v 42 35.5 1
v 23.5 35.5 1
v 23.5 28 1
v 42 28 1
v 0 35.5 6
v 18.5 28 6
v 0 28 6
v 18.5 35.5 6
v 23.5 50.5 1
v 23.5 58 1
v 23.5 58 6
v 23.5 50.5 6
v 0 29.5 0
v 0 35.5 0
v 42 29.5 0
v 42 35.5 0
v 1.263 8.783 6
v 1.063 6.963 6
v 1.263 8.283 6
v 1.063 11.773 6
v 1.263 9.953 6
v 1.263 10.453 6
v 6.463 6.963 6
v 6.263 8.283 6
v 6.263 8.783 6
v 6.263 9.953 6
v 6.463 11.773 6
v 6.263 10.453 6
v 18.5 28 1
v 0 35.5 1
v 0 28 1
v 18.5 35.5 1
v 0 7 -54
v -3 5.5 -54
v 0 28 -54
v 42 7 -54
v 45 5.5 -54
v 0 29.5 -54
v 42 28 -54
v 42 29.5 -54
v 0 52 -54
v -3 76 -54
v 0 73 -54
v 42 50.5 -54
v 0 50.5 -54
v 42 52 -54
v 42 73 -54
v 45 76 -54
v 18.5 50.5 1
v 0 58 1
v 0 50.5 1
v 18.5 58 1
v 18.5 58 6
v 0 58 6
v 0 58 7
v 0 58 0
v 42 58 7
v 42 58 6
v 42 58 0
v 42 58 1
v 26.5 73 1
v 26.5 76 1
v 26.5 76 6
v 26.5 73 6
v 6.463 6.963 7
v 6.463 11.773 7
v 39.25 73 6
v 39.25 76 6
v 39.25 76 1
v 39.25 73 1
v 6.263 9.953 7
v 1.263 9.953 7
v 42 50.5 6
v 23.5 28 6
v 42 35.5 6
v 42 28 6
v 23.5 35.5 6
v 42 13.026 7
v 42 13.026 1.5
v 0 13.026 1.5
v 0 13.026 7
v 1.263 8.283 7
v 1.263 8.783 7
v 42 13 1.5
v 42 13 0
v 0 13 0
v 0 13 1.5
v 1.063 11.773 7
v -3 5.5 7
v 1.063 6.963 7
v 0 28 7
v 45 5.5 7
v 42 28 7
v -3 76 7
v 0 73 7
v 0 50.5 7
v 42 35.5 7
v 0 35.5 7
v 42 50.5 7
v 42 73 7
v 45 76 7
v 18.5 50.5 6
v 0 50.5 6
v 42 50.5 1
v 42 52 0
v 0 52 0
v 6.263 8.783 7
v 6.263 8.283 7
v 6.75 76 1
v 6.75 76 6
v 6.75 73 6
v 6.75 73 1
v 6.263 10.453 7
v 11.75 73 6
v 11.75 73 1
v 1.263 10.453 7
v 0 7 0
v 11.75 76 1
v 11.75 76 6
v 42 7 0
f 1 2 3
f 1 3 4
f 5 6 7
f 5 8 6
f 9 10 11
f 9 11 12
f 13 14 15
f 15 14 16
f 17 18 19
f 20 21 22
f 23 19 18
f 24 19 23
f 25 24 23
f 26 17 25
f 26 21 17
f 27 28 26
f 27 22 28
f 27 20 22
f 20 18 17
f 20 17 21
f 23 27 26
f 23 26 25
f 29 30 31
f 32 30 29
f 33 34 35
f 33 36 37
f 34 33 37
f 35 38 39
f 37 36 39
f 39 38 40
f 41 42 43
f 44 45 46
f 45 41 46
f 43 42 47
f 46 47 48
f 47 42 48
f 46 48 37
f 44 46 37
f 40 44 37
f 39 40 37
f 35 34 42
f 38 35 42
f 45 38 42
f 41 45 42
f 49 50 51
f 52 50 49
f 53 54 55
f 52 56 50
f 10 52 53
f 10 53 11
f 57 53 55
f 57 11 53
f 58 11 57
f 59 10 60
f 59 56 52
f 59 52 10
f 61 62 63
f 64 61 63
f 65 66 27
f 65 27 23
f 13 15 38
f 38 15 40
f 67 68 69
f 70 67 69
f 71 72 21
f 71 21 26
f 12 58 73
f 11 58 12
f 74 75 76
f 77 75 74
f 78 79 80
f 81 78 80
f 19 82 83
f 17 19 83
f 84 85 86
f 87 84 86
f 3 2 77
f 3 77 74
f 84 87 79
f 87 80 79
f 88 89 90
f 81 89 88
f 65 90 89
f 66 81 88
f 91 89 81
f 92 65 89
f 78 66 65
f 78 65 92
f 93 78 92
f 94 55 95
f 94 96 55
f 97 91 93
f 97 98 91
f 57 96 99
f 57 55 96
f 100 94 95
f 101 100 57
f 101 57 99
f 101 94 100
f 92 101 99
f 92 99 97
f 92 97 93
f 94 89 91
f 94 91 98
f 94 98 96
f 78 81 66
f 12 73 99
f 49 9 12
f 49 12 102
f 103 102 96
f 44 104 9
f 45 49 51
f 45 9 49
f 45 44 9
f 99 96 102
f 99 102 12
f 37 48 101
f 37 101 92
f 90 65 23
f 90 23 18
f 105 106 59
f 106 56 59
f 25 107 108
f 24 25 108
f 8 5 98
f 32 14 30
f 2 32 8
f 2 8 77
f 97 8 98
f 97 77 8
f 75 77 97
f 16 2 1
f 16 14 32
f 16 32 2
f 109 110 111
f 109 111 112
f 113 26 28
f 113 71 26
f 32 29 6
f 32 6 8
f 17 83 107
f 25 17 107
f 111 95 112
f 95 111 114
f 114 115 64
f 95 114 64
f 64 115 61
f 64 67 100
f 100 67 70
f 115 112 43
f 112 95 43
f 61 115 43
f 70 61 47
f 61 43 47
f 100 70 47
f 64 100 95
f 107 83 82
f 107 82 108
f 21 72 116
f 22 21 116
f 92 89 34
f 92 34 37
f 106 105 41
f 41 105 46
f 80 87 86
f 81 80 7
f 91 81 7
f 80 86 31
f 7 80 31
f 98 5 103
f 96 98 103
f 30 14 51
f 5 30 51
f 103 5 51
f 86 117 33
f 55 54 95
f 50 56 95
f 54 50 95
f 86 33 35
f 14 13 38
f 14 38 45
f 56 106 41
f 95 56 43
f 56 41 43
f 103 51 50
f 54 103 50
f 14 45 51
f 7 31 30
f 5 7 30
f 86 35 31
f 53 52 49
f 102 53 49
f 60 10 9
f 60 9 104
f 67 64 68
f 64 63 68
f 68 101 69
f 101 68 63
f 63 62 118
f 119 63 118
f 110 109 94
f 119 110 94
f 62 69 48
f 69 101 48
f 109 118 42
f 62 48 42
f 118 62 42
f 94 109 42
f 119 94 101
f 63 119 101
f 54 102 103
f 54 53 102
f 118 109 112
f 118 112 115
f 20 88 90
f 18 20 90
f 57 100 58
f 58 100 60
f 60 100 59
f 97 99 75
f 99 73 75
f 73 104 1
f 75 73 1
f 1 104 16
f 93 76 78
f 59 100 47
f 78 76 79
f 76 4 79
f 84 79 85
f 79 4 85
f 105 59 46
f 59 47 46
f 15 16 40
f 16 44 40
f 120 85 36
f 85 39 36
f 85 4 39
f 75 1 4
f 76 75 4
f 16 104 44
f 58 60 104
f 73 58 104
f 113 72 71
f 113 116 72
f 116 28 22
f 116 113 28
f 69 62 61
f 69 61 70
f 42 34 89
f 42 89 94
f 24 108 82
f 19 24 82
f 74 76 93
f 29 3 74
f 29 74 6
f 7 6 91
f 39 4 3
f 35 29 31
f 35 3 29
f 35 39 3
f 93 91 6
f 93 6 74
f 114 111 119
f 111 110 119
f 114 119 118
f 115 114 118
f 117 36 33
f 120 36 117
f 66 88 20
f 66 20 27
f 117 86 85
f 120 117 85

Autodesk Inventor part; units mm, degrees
ref_plane "YZ Plane" through (0, 0, 0) normal (1, 0, 0) x (0, 1, 0)
ref_plane "XZ Plane" through (0, 0, 0) normal (0, 1, 0) x (-1, 0, 0)
ref_plane "XY Plane" through (0, 0, 0) normal (0, 0, 1) x (1, 0, 0)
ref_plane "Plano de trabajo1" through (0, 3, 0) normal (0, 1, 0) x (1, 0, 0)
ref_plane "Plano de trabajo2" through (4.2498, 73, -5.25) normal (0, 1, 0) x (1, 0, 0)
sketch "Boceto3" plane through (4.2498, 73, -5.25) normal (0, 1, 0) x (1, 0, 0)
  line L0 (37.7502, 51.75) -> (40.7502, 51.75)
  line L1 (-7.2498, -8.25) -> (40.7502, -8.25)
  line L2 (40.7502, -8.25) -> (40.7502, 51.75)
  line L3 (40.7502, 51.75) -> (-7.2498, 51.75)
  line L4 (-7.2498, 51.75) -> (-7.2498, -8.25)
  circle A0 centre (33.5, 43.5) radius 1.25
  circle A1 centre (33.5, 0) radius 1.25
  circle A2 centre (0, 43.5) radius 1.25
  circle A3 centre (0, 0) radius 1.25
  point P0 (-4.2498, -5.25)
  point P1 (37.7502, -5.25)
  point P2 (37.7502, 48.75)
  dimension "d39" = 2.5
  dimension "d40" = 2.5
  dimension "d41" = 2.5
  dimension "d42" = 2.5
ref_plane "Plano de trabajo3" through (4.2498, 73, -5.25) normal (0, -1, 0) x (1, 0, 0)
sketch "Boceto5" plane through (4.2498, 73, -5.25) normal (0, -1, 0) x (1, 0, 0)
  line L0 (-4.2498, 5.25) -> (-4.2498, -48.75) projected
  line L1 (-4.2498, 5.25) -> (-4.2498, -48.75)
  line L2 (37.7502, -48.75) -> (37.7502, 5.25)
  line L3 (37.7502, 5.25) -> (37.7502, 8.25)
  line L4 (37.7502, -48.75) -> (37.7502, -51.75)
  line L5 (-4.2498, 5.25) -> (-7.2498, 5.25)
  line L6 (-4.2498, -48.75) -> (-7.2498, -48.75)
  line L7 (37.7502, -48.75) -> (40.7502, -48.75)
  line L8 (37.7502, 5.25) -> (40.7502, 5.25)
  line L9 (40.7502, 5.25) -> (40.7502, -48.75)
  line L10 (40.7502, -51.75) -> (40.7502, 8.25) projected
  line L11 (-7.2498, -48.75) -> (-7.2498, 5.25)
  line L12 (-7.2498, 8.25) -> (-7.2498, -51.75) projected
extrude "Extrusión5" add sketch "Boceto5" along normal blind 67.5
extrude "Extrusión6" add sketch "Boceto3" along normal blind 3
sketch "Boceto6" plane through (4.2498, 76, -5.25) normal (0, 1, 0) x (1, 0, 0)
  circle A0 centre (0, 43.5) radius 1.25 projected
  circle A1 centre (0, 43.5) radius 1.25
  circle A2 centre (33.5, 43.5) radius 1.25 projected
  circle A3 centre (33.5, 43.5) radius 1.25
  circle A4 centre (33.5, 0) radius 1.25 projected
  circle A5 centre (33.5, 0) radius 1.25
  circle A6 centre (0, 0) radius 1.25
  point P0 (-4.2498, -5.25)
extrude "Extrusión7" add sketch "Boceto6" against normal blind 3
sketch "Boceto8" plane through (45, 5.5, 0) normal (1, 0, 0) x (0, 0, -1)
  line L0 (0, 0) -> (54, 0) projected
  line L1 (0, 0) -> (54, 0)
  line L2 (54, 0) -> (54, 1.5)
  line L3 (54, 1.5) -> (0, 1.5)
  line L4 (0, 67.5) -> (0, 0) projected
  line L5 (0, 0) -> (0, 1.5)
  line L6 (54, 1.5) -> (54, 21.5)
  line L7 (54, 21.5) -> (54, 22.5)
  line L8 (54, 22.5) -> (0, 22.5)
  line L9 (0, 22.5) -> (0, 24)
  line L10 (0, 24) -> (54, 24)
  line L11 (54, 22.5) -> (54, 24)
  line L12 (54, 24) -> (54, 45)
  line L13 (54, 67.5) -> (54, 0) projected
  line L14 (54, 45) -> (0, 45)
  line L15 (0, 45) -> (0, 46.5)
  line L16 (0, 46.5) -> (54, 46.5)
  line L17 (54, 45) -> (54, 46.5)
  line L18 (54, 67.5) -> (0, 67.5) projected
  line L19 (54, 46.5) -> (54, 67.5)
  point P0 (0, -5.5)
  dimension "d54" = 1.5
  dimension "d55" = 20
  dimension "d60" = 1
  dimension "d61" = 1.5
  dimension "d62" = 21
  dimension "d63" = 1.5
extrude "Extrusión8" add sketch "Boceto8" against normal blind 47.25 contours L4 L3 L2 L0 | L4 L10 L11 L8 | L4 L16 L13 L14
sketch "Boceto9" plane through (-3, 5.5, 0) normal (0, 0, 1) x (1, 0, 0)
  line L0 (3, 67.5) -> (3, 46.5) projected
  line L1 (3, 46.5) -> (3, 52.5)
  line L2 (3, 52.5) -> (45, 52.5)
  line L3 (45, 67.5) -> (45, 46.5) projected
  line L4 (45, 52.5) -> (45, 46.5)
  line L5 (45, 46.5) -> (3, 46.5) projected
  line L6 (45, 46.5) -> (3, 46.5)
  line L7 (45, 45) -> (45, 24) projected
  line L8 (3, 24) -> (45, 24)
  line L9 (45, 24) -> (45, 30)
  line L10 (45, 30) -> (3, 30)
  line L11 (3, 30) -> (3, 24)
  line L12 (45, 22.5) -> (45, 1.5) projected
  line L13 (3, 2) -> (3, 1.5)
  line L14 (45, 1.5) -> (3, 1.5) projected
  line L15 (3, 1.5) -> (45, 1.5)
  line L16 (45, 1.5) -> (45, 7.5)
  line L17 (45, 22.5) -> (45, 1.5) projected
  line L18 (45, 7.5) -> (3, 7.5)
  line L19 (45, 7.5) -> (45, 1.5)
  line L20 (3, 1.5) -> (3, 7.5)
  line L21 (3, 22.5) -> (3, 1.5) projected
  point P0 (3, -5.5)
  point P1 (45, 8)
  point P2 (45, 2)
  dimension "d66" = 6
  dimension "d70" = 6
extrude "Extrusión10" add sketch "Boceto9" along normal blind 1.5
sketch "Boceto11" plane through (-3, 5.5, 0) normal (0, 0, 1) x (1, 0, 0)
  line L0 (48, 0) -> (0, 0) projected
  line L1 (48, 0) -> (0, 0)
  line L2 (0, 0) -> (0, 67.5)
  line L3 (3, 67.5) -> (3, 52.5) projected
  line L4 (0, 67.5) -> (3, 67.5)
  line L5 (3, 67.5) -> (3, 46.5)
  line L6 (45, 46.5) -> (3, 46.5) projected
  line L7 (3, 46.5) -> (45, 46.5)
  line L8 (45, 67.5) -> (45, 52.5) projected
  line L9 (45, 46.5) -> (45, 67.5)
  line L10 (48, 67.5) -> (45, 67.5) projected
  line L11 (45, 67.5) -> (48, 67.5)
  line L12 (48, 67.5) -> (48, 0)
  line L13 (3, 7.5) -> (3, 1.5) projected
  line L14 (3, 22.5) -> (3, 7.5) projected
  line L15 (3, 7.5) -> (3, 22.5)
  line L16 (3, 22.5) -> (45, 22.5)
  line L17 (45, 22.5) -> (45, 1.5) projected
  line L18 (45, 22.5) -> (45, 1.5)
  line L19 (45, 1.5) -> (3, 1.5)
  line L20 (3, 1.5) -> (3, 7.5)
  line L21 (45, 24) -> (3, 24) projected
  line L22 (3, 24) -> (45, 24)
  line L23 (45, 24) -> (45, 45)
  line L24 (3, 45) -> (3, 30) projected
  line L25 (45, 45) -> (3, 45)
  line L26 (3, 45) -> (3, 24)
  point P0 (3, -5.5)
  dimension "d75" = 21
extrude "Extrusión12" add sketch "Boceto11" along normal blind 1.5
sketch "Boceto12" plane through (-3, 73, 3) normal (0, 0, 1) x (1, 0, 0)
  line L0 (45, 0) -> (48, 0) projected
  line L1 (0, 3) -> (48, 3)
  line L2 (48, 3) -> (48, 0)
  line L3 (48, 0) -> (0, 0)
  line L4 (0, 0) -> (0, 3)
  point P0 (3, -73)
extrude "Extrusión13" cut sketch "Boceto12" against normal blind 1.5
sketch "Boceto13" plane through (45, 73, -57) normal (0, 0, -1) x (-1, 0, 0)
  line L0 (0, 3) -> (48, 3)
  line L1 (48, 3) -> (48, 0)
  line L2 (48, 0) -> (0, 0)
  line L3 (0, 0) -> (0, 3)
  point P0 (45, -73)
extrude "Extrusión14" cut sketch "Boceto13" against normal blind 3
sketch "Boceto14" plane through (-3, 5.5, 1.5) normal (0, 0, 1) x (1, 0, 0)
  line L0 (48, 70.5) -> (0, 70.5) projected
  line L1 (0, 0) -> (48, 0) projected
  line L2 (0, 70.5) -> (48, 70.5)
  line L3 (48, 70.5) -> (48, 0)
  line L4 (48, 0) -> (0, 0)
  line L5 (0, 0) -> (0, 70.5)
  line L6 (3, 45) -> (45, 45) projected
  line L7 (3, 45) -> (45, 45)
  line L8 (45, 45) -> (45, 30)
  line L9 (45, 30) -> (3, 30)
  line L10 (3, 30) -> (3, 45)
  line L11 (3, 22.5) -> (45, 22.5) projected
  line L12 (45, 22.5) -> (45, 1.5) projected
  line L13 (3, 22.5) -> (45, 22.5)
  line L14 (45, 22.5) -> (45, 7.5257)
  line L15 (45, 7.5257) -> (3, 7.5257)
  line L16 (3, 7.5257) -> (3, 22.5)
  line L17 (3, 52.5) -> (3, 67.5) projected
  line L18 (45, 67.5) -> (45, 46.5) projected
  line L19 (3, 67.5) -> (45, 67.5)
  line L20 (45, 67.5) -> (45, 52.5)
  line L21 (45, 52.5) -> (3, 52.5)
  line L22 (3, 52.5) -> (3, 67.5)
  point P0 (3, -5.5)
  dimension "d86" = 15
extrude "Extrusión15" add sketch "Boceto14" along normal blind 5.5
sketch "Boceto15" plane through (0, 58, 0) normal (0, 1, 0) x (1, 0, 0)
  line L0 (42, 0) -> (42, -7)
  line L1 (0, -7) -> (0, 0)
  line L2 (0, -7) -> (1.5, -7)
  line L3 (0, -7) -> (0, -5.5)
  line L4 (0, 0) -> (0, -7) projected
  line L5 (42, -7) -> (42, -6)
  line L6 (42, 0) -> (42, -7) projected
  line L7 (42, -6) -> (0, -6)
  line L8 (0, -7) -> (0, -6)
  line L9 (0, 0) -> (0, -1)
  line L10 (0, -1) -> (42, -1)
  line L11 (42, 0) -> (42, -1)
  dimension "d89" = 1.5
  dimension "d90" = 1.5
  dimension "d91" = 1
extrude "Extrusión16" cut sketch "Boceto15" against normal blind 41.75
sketch "Boceto16" plane through (0, 28, 1) normal (0, 0, 1) x (1, 0, 0)
  line L0 (42, 0) -> (0, 0) projected
  line L1 (0, 0) -> (42, 0)
  line L2 (0, 7.5) -> (42, 7.5) projected
  line L3 (21, 0) -> (18.5, 0)
  line L4 (18.5, 0) -> (18.5, 7.5)
  line L5 (18.5, 7.5) -> (23.5, 7.5)
  line L6 (23.5, 7.5) -> (23.5, 0)
  point P0 (0, -28)
  dimension "d94" = 2.5
  dimension "d95" = 5
extrude "Extrusión17" add sketch "Boceto16" along normal blind 5.75
sketch "Boceto17" plane through (0, 58, 1) normal (0, 0, 1) x (1, 0, 0)
  line L0 (0, 0) -> (42, 0) projected
  line L1 (21, 0) -> (18.5, 0)
  line L2 (18.5, 0) -> (23.5, 0)
  line L3 (23.5, 0) -> (23.5, -7.5)
  line L4 (42, -28.5) -> (0, -28.5) projected
  line L5 (23.5, -7.5) -> (18.5, -7.5)
  line L6 (42, -7.5) -> (0, -7.5) projected
  line L7 (18.5, 0) -> (18.5, -7.5)
  point P0 (0, -58)
  dimension "d98" = 2.5
  dimension "d99" = 5
  dimension "d100" = 7.5
extrude "Extrusión18" add sketch "Boceto17" along normal blind 5.75
sketch "Boceto18" plane through (4.2498, 76, -5.25) normal (0, 1, 0) x (1, 0, 0)
  line L0 (-4.2498, 48.75) -> (-4.2498, -12.25) projected
  line L1 (-4.2498, -12.25) -> (-4.2498, -11.25)
  line L2 (-4.2498, -11.25) -> (-4.2498, -6.25)
  line L3 (2.5002, -11.25) -> (7.5002, -11.25)
  line L4 (-4.2498, -5.25) -> (-4.2498, 48.75) projected
  line L5 (7.5002, -11.25) -> (7.5002, -6.25)
  line L6 (2.5002, -11.25) -> (2.5002, -6.25)
  line L7 (2.5002, -6.25) -> (7.5002, -6.25)
  line L8 (23.5002, -6.25) -> (23.5002, -11.25)
  line L9 (33.5002, -6.25) -> (33.5002, -11.25)
  line L10 (23.5002, -6.25) -> (33.5002, -6.25)
  line L11 (23.5002, -11.25) -> (33.5002, -11.25)
  dimension "d103" = 1
  dimension "d104" = 5
extrude "Extrusión19" cut sketch "Boceto18" against normal blind 6
sketch "Boceto19" plane through (4.2498, 76, -5.25) normal (0, 1, 0) x (1, 0, 0)
  line L0 (23.5002, -6.25) -> (33.5002, -6.25) projected
  line L1 (23.5002, -6.25) -> (22.2502, -6.25)
  line L2 (37.7502, -6.25) -> (19.2502, -6.25) projected
  line L3 (23.5002, -11.25) -> (22.2502, -11.25)
  line L4 (19.2502, -11.25) -> (37.7502, -11.25) projected
  line L5 (22.2502, -6.25) -> (22.2502, -11.25)
  line L6 (-4.2498, -6.75) -> (37.7502, -6.75) projected
  line L7 (33.5002, -6.25) -> (35, -6.25)
  line L8 (35, -11.25) -> (35, -6.25)
  line L9 (23.5002, -11.25) -> (33.5002, -11.25) projected
  line L10 (35, -11.25) -> (33.5002, -11.25)
  point P0 (-4.2498, -5.25)
  dimension "d115" = 1.25
extrude "Extrusión20" cut sketch "Boceto19" against normal blind 9.5
sketch "Boceto20" plane through (-3, 5.5, 7) normal (0, 0, 1) x (1, 0, 0)
  line L0 (3, 7.5) -> (3, 7.5257) projected
  line L1 (45, 1.5) -> (3, 1.5) projected
  line L2 (4.2634, 4.6029) -> (9.2628, 4.6029)
  line L3 (4.2634, 2.9329) -> (9.2628, 2.9329)
  line L4 (4.2634, 3.1329) -> (9.2628, 3.1329)
  line L5 (4.2634, 4.8029) -> (9.2628, 4.8029)
  line L6 (4.2634, 4.8029) -> (4.2634, 6.2729)
  line L7 (4.2634, 6.2729) -> (9.2628, 6.2729)
  line L8 (9.2628, 2.9329) -> (9.2628, 1.4629)
  line L9 (9.2628, 1.4629) -> (4.2634, 1.4629)
  line L10 (4.2634, 1.4629) -> (4.2634, 2.9329)
  line L11 (4.2634, 3.1329) -> (4.2634, 4.6029)
  line L12 (9.2628, 4.8029) -> (9.2628, 6.2729)
  line L13 (9.2628, 4.6029) -> (9.2628, 3.1329)
  point P0 (3, -5.5)
  dimension "d135" = 1.47
extrude "Extrusión21" cut sketch "Boceto20" against normal blind 1
sketch "Boceto21" plane through (-3, 5.5, 7) normal (0, 0, 1) x (1, 0, 0)
  line L0 (4.2634, 6.2729) -> (9.2628, 6.2729) projected
  line L1 (4.2634, 6.2729) -> (9.2628, 6.2729)
  line L2 (9.2628, 2.9329) -> (9.2628, 1.4629) projected
  line L3 (9.2628, 6.2729) -> (9.2628, 1.4629)
  line L4 (9.2628, 1.4629) -> (4.2634, 1.4629) projected
  line L5 (9.2628, 1.4629) -> (4.2634, 1.4629)
  line L6 (4.2634, 4.8029) -> (4.2634, 6.2729) projected
  line L7 (4.2634, 1.4629) -> (4.2634, 6.2729)
  line L8 (4.2634, 6.2729) -> (4.0634, 6.2729)
  line L9 (4.0634, 6.2729) -> (4.0634, 1.4629)
  line L10 (45, 1.5) -> (3, 1.5) projected
  line L11 (4.0634, 1.4629) -> (4.2634, 1.4629)
  line L12 (9.2628, 6.2729) -> (9.2628, 4.8029) projected
  line L13 (9.2628, 6.2729) -> (9.4628, 6.2729)
  line L14 (9.4628, 6.2729) -> (9.4628, 1.4629)
  line L15 (9.4628, 1.4629) -> (9.2628, 1.4629)
  point P0 (3, -5.5)
  dimension "d138" = 0.2
  dimension "d139" = 0.2
extrude "Extrusión22" cut sketch "Boceto21" against normal blind 1 contours L6 L7 L10 L9 L8 | L13 L14 L10 L2 L3 | L7 L11 L9 L10 | L14 L15 L2 L10
sketch "Boceto22" plane through (-3, 5.5, 7) normal (0, 0, 1) x (1, 0, 0)
  line L0 (4.2634, 4.8029) -> (4.2634, 4.6029) projected
  line L1 (4.2634, 4.7029) -> (4.7634, 4.7029) construction
  line L2 (4.2634, 4.7029) -> (4.2634, 4.9529)
  line L3 (4.2634, 4.7029) -> (4.2634, 4.4529)
  line L4 (4.2634, 4.4529) -> (9.2628, 4.4529)
  line L5 (4.2634, 4.6029) -> (9.2628, 4.6029) projected
  line L6 (9.2628, 4.4529) -> (9.2628, 4.9529)
  line L7 (9.2628, 4.6029) -> (9.2628, 4.8029) projected
  line L8 (9.2628, 4.9529) -> (4.2634, 4.9529)
  line L9 (4.2634, 3.1329) -> (4.2634, 2.9329) projected
  line L10 (4.2634, 3.0329) -> (4.2634, 3.2829)
  line L11 (4.2634, 3.2829) -> (9.2628, 3.2829)
  line L12 (9.2628, 3.2829) -> (9.2628, 2.7829)
  line L13 (9.2628, 2.7829) -> (4.2634, 2.7829)
  line L14 (4.2634, 2.7829) -> (4.2634, 3.0329)
  point P0 (3, -5.5)
  dimension "d148" = 0.5
  dimension "d149" = 0.25
  dimension "d150" = 0.5
extrude "Extrusión23" add sketch "Boceto22" against normal blind 1
properties part number "Relé - columnes tapa"
